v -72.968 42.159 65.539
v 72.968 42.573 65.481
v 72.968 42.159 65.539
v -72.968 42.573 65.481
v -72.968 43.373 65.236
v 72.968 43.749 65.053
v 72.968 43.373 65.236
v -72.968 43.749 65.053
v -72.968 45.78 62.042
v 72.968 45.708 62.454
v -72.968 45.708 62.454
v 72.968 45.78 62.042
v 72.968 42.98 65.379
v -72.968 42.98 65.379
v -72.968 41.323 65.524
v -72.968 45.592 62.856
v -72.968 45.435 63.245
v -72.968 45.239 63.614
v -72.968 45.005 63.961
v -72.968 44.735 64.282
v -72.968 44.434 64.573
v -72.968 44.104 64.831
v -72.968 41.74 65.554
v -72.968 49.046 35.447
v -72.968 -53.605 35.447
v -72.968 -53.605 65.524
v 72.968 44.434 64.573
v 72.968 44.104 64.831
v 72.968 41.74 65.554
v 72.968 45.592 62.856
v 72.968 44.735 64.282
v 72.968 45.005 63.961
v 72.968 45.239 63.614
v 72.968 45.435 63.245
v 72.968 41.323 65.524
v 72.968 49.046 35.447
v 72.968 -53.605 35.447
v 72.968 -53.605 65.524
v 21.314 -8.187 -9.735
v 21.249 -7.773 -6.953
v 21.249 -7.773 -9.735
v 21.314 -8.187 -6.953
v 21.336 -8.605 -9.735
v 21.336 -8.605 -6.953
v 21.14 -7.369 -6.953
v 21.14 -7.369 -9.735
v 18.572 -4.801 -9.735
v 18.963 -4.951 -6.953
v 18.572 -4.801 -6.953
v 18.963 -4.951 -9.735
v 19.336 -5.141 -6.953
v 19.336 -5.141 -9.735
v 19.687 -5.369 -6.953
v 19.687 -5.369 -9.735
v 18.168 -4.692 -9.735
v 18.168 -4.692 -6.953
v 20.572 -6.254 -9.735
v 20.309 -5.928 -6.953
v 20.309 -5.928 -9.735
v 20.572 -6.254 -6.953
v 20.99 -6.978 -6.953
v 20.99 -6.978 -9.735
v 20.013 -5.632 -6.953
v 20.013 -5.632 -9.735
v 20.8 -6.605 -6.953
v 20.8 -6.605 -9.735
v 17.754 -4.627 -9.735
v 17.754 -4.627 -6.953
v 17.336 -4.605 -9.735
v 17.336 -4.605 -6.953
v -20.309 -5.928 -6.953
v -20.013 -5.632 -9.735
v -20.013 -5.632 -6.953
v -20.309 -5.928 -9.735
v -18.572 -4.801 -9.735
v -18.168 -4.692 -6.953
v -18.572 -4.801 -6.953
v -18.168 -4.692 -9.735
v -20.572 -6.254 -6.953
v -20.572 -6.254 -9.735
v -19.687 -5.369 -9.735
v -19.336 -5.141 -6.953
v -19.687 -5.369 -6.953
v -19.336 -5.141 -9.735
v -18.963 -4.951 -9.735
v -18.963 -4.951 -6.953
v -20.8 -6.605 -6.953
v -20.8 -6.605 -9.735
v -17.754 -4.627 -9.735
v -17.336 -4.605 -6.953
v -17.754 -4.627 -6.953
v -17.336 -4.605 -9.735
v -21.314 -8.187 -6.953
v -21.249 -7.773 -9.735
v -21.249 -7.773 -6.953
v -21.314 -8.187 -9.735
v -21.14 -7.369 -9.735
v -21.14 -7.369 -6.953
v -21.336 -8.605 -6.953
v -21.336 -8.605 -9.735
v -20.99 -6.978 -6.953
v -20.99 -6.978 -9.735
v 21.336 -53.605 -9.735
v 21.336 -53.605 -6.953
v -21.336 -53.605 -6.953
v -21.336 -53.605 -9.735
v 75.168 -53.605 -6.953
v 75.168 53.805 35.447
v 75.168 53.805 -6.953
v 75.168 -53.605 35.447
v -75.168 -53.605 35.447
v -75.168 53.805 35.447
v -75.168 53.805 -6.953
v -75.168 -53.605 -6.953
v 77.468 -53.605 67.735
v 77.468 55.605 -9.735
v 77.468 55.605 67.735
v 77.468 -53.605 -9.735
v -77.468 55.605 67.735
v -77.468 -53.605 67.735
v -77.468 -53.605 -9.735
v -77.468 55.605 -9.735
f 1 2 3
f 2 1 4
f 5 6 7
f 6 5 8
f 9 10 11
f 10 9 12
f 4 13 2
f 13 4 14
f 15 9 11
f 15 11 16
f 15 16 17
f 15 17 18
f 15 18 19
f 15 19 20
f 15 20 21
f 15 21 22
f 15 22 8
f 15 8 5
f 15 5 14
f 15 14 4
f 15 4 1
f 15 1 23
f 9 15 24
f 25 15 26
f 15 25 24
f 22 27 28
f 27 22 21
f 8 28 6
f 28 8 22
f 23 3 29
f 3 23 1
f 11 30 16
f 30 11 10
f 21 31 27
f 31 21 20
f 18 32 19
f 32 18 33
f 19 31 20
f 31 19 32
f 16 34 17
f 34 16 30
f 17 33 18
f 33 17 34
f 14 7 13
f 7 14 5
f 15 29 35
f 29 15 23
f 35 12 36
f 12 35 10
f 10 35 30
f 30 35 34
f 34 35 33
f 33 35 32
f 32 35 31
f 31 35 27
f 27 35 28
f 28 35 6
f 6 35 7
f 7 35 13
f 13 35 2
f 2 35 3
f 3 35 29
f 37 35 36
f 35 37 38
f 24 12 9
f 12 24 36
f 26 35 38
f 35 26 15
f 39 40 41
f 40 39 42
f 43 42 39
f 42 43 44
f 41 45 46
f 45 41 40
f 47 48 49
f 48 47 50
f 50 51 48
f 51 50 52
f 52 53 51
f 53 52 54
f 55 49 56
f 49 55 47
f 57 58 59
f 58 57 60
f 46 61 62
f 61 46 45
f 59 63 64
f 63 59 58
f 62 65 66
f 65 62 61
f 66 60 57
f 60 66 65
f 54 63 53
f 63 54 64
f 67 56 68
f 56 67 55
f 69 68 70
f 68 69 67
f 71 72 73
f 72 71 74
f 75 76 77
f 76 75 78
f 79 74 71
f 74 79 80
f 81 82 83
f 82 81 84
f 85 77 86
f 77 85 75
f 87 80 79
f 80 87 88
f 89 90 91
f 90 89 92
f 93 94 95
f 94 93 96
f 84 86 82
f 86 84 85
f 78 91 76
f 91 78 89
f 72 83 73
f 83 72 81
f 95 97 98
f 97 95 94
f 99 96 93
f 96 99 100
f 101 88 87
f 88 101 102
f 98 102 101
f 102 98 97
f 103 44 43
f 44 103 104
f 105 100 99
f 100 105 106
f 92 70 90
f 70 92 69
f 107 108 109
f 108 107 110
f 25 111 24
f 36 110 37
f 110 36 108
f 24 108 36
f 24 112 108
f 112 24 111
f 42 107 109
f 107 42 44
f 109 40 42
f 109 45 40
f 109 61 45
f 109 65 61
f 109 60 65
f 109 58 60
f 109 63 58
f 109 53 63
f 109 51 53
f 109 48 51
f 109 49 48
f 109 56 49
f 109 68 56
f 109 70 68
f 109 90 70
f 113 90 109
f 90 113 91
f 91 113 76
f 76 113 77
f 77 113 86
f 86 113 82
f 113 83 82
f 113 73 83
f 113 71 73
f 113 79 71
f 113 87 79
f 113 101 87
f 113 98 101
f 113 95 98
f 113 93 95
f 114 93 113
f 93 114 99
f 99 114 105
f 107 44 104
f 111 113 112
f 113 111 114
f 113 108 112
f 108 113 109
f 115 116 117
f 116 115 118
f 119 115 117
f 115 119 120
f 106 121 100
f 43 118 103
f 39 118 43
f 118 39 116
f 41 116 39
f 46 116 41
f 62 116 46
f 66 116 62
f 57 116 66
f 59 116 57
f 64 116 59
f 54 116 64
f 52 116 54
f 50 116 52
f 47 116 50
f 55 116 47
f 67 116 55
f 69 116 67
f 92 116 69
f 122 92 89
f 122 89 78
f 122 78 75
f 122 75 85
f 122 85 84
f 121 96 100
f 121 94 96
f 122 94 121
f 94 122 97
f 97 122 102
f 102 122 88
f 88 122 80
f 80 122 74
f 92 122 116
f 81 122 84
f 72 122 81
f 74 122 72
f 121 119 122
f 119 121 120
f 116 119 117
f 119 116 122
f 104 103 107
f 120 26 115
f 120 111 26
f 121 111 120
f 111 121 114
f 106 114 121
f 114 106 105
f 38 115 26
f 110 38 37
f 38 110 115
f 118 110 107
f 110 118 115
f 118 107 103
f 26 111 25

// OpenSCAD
// file: CONFIG_Basic.scad
cards = [
    [60, "Copper - ", "Treasure"], 
    [40, "Silver -", "Treasure"],
    [30, "Gold -", "Treasure"],
    [12, "Platinum -", "Treasure"],
    
    [-6], [0], // Divider
    
    [24, "Estate -", "Victory"],
    [12, "Duchy -", "Victory"],
    [12, "Province -", "Victory"],
    [12, "Colony -", "Victory"],
    
    [-6], [0], // Divider
    
    [30, "Curse -", "Curse"],
];

forceBoxLength = 2 * 72.4709 + 2.783 + 2.211;
// file: DominionBoxHelper.scad
cards = [];
forceBoxLength = 0;

$fn = 60;
cardThickness = 0.3231333;
deckTolorance = 0.5;
slotHeight = 40;
cardLength = 92;
cardWidth = 60;
deckShift = 14;
deckRotation = 7;
boxThickness = [2,1,2];
cardEdgeRadius = 4;
textPlateThickness = 0.4;
textThickness = 0.4;

rotatedWidth = cos(deckRotation) * (cardLength + deckShift);
rotatedHeight = cos(deckRotation) * (cardWidth) + sin(deckRotation) * (cardLength + deckShift);

allCardsThickness = cardThickness*sum_to_index(cards, len(cards)-1) + deckTolorance * len(cards);

boxSize = [
        max(forceBoxLength, allCardsThickness + 2 * boxThickness.x),
        rotatedWidth + 2 * boxThickness.y,
        slotHeight + boxThickness.z
        ];

module defineObject(object_name) {
    if (current_object != "ALL" && current_object != object_name) {
        *children();
    } else {
        children();
    }
}

function sum_to_index(arr, i) =
    i < 0 ? 0 : abs(arr[i][0]) + sum_to_index(arr, i - 1);
    
module deck(i)
{
    union()
    {
        depth = cardThickness*cards[i][0] + deckTolorance + 0.01;
        rotate([0,90,0])
        translate([(0.5*cardWidth - cardEdgeRadius), (0.5*cardLength - cardEdgeRadius), 0])
        cylinder(h=depth, r=cardEdgeRadius, center=true);
        rotate([0,90,0])
        translate([-(0.5*cardWidth - cardEdgeRadius), (0.5*cardLength - cardEdgeRadius), 0])
        cylinder(h=depth, r=cardEdgeRadius, center=true);
        rotate([0,90,0])
        translate([(0.5*cardWidth - cardEdgeRadius), -(0.5*cardLength - cardEdgeRadius), 0])
        cylinder(h=depth, r=cardEdgeRadius, center=true);
        rotate([0,90,0])
        translate([-(0.5*cardWidth - cardEdgeRadius), -(0.5*cardLength - cardEdgeRadius), 0])
        cylinder(h=depth, r=cardEdgeRadius, center=true);
        cube([depth, cardLength - 2 * cardEdgeRadius, cardWidth], true);
        cube([depth, cardLength, cardWidth - 2 * cardEdgeRadius], true);
    }
}
    
module cardSlot(i)
{
    slotThickness = cardThickness*cards[i][0] + deckTolorance + 0.01;
    rotate((i%2 ? -1 : 1) * deckRotation, [1,0,0])
    translate(0.5*[slotThickness, cardLength, cardWidth])
    translate(-0.5 * [allCardsThickness, cardLength, 0]) // center
    translate([cardThickness*sum_to_index(cards, i-1) + deckTolorance * i, (i%2 ? -0.5 : 0.5)*deckShift, 0])
    deck(i);
}

module tokenSlot()
{
    slotThickness = 20;
    
    translate(0.5*[slotThickness, cardLength, cardWidth])
    translate(-0.5 * [allCardsThickness, cardLength, 0]) // center
    translate([allCardsThickness, 0, 0])
    cube([slotThickness, cardLength, cardWidth], true);
}

module cardName(i)
{
    translate([cardThickness*sum_to_index(cards, i-1) + deckTolorance * i, 0, 0])
    translate(0.5*[cardThickness*cards[i][0], 0, -3])
    rotate([90,-90,0])
    {
        linear_extrude(height=textThickness)
        text(cards[i][1], 2.6, "overpass", halign = "right", valign = "center");
    }
}
// main file
include <DominionBoxHelper.scad>

include <CONFIG_Basic.scad>

current_object = "ALL";
//current_object = "Lid";
//current_object = "Box";
//current_object = "TextPlate";
//current_object = "action";
//current_object = "treasure";
//current_object = "victory";
//current_object = "curse";
//current_object = "duration";

lidSize = [
    boxSize.x + 2.5 * boxThickness.x,
    boxSize.y + 2 * boxThickness.y,
    rotatedHeight + 2.5 * boxThickness.z,
];

module lidNegative()
{
    
    union()
    {
        translate([0,0,0.5 * (slotHeight - boxThickness.z) - sin(deckRotation)*(0.5*(cardLength-deckShift))])
        cube(boxSize + 0.4 * [1,1,1], true);
        
        rotate(deckRotation, [1,0,0])
        translate(0.5*[0, cardLength, cardWidth])
        translate(-0.5 * [0, cardLength, 0]) // center
        translate([0, (0.5)*deckShift, 0])
        {
            length = boxSize.x - 2 * boxThickness.x;
            
            rotate([0,90,0])
            translate([-(0.5*cardWidth - cardEdgeRadius), (0.5*cardLength - cardEdgeRadius), 0])
            cylinder(h=length, r=cardEdgeRadius, center=true);
            
            
            #cube([length, cardLength, cardWidth - 2 * cardEdgeRadius], true);
            
            translate([0, (0.5*cardLength - cardEdgeRadius), (0.5*cardWidth - cardEdgeRadius) + cardEdgeRadius])
            rotate(deckRotation, [-1,0,0])
            translate(-0.5 * [0,boxSize.y,cardWidth])
            cube([length,boxSize.y,cardWidth], center=true);
        }
        
        translate(0.5*[0, -lidSize.y, cardWidth - lidSize.z])
        translate(0.25*[0, cardLength, 0])
        {
            tabHeight = 4 * boxThickness.z;
            
            translate(0.5 * [0.5 * allCardsThickness, 0.5 * cardLength, 0])
            translate([-cardEdgeRadius, 0, 0])
            cylinder(h=(tabHeight), r=cardEdgeRadius, center=true);
            
            
            translate(0.5 * [-0.5 * allCardsThickness, 0.5 * cardLength, 0])
            translate([cardEdgeRadius, 0, 0])
            cylinder(h=(tabHeight), r=cardEdgeRadius, center=true);
            
            cube([0.5 * allCardsThickness, 0.5 * cardLength, tabHeight], center=true);
            
            cube([0.5 * allCardsThickness - 2 * cardEdgeRadius, 0.5 * cardLength + 2 * cardEdgeRadius, tabHeight], center=true);
        }
        
        
    }
}


defineObject("Lid") color("#fff3d6")
{
    difference()
    {
        translate([0, boxThickness.y, 0.5* (cardWidth - boxThickness.z)])
        cube(lidSize, true);
        lidNegative();
    }
}
